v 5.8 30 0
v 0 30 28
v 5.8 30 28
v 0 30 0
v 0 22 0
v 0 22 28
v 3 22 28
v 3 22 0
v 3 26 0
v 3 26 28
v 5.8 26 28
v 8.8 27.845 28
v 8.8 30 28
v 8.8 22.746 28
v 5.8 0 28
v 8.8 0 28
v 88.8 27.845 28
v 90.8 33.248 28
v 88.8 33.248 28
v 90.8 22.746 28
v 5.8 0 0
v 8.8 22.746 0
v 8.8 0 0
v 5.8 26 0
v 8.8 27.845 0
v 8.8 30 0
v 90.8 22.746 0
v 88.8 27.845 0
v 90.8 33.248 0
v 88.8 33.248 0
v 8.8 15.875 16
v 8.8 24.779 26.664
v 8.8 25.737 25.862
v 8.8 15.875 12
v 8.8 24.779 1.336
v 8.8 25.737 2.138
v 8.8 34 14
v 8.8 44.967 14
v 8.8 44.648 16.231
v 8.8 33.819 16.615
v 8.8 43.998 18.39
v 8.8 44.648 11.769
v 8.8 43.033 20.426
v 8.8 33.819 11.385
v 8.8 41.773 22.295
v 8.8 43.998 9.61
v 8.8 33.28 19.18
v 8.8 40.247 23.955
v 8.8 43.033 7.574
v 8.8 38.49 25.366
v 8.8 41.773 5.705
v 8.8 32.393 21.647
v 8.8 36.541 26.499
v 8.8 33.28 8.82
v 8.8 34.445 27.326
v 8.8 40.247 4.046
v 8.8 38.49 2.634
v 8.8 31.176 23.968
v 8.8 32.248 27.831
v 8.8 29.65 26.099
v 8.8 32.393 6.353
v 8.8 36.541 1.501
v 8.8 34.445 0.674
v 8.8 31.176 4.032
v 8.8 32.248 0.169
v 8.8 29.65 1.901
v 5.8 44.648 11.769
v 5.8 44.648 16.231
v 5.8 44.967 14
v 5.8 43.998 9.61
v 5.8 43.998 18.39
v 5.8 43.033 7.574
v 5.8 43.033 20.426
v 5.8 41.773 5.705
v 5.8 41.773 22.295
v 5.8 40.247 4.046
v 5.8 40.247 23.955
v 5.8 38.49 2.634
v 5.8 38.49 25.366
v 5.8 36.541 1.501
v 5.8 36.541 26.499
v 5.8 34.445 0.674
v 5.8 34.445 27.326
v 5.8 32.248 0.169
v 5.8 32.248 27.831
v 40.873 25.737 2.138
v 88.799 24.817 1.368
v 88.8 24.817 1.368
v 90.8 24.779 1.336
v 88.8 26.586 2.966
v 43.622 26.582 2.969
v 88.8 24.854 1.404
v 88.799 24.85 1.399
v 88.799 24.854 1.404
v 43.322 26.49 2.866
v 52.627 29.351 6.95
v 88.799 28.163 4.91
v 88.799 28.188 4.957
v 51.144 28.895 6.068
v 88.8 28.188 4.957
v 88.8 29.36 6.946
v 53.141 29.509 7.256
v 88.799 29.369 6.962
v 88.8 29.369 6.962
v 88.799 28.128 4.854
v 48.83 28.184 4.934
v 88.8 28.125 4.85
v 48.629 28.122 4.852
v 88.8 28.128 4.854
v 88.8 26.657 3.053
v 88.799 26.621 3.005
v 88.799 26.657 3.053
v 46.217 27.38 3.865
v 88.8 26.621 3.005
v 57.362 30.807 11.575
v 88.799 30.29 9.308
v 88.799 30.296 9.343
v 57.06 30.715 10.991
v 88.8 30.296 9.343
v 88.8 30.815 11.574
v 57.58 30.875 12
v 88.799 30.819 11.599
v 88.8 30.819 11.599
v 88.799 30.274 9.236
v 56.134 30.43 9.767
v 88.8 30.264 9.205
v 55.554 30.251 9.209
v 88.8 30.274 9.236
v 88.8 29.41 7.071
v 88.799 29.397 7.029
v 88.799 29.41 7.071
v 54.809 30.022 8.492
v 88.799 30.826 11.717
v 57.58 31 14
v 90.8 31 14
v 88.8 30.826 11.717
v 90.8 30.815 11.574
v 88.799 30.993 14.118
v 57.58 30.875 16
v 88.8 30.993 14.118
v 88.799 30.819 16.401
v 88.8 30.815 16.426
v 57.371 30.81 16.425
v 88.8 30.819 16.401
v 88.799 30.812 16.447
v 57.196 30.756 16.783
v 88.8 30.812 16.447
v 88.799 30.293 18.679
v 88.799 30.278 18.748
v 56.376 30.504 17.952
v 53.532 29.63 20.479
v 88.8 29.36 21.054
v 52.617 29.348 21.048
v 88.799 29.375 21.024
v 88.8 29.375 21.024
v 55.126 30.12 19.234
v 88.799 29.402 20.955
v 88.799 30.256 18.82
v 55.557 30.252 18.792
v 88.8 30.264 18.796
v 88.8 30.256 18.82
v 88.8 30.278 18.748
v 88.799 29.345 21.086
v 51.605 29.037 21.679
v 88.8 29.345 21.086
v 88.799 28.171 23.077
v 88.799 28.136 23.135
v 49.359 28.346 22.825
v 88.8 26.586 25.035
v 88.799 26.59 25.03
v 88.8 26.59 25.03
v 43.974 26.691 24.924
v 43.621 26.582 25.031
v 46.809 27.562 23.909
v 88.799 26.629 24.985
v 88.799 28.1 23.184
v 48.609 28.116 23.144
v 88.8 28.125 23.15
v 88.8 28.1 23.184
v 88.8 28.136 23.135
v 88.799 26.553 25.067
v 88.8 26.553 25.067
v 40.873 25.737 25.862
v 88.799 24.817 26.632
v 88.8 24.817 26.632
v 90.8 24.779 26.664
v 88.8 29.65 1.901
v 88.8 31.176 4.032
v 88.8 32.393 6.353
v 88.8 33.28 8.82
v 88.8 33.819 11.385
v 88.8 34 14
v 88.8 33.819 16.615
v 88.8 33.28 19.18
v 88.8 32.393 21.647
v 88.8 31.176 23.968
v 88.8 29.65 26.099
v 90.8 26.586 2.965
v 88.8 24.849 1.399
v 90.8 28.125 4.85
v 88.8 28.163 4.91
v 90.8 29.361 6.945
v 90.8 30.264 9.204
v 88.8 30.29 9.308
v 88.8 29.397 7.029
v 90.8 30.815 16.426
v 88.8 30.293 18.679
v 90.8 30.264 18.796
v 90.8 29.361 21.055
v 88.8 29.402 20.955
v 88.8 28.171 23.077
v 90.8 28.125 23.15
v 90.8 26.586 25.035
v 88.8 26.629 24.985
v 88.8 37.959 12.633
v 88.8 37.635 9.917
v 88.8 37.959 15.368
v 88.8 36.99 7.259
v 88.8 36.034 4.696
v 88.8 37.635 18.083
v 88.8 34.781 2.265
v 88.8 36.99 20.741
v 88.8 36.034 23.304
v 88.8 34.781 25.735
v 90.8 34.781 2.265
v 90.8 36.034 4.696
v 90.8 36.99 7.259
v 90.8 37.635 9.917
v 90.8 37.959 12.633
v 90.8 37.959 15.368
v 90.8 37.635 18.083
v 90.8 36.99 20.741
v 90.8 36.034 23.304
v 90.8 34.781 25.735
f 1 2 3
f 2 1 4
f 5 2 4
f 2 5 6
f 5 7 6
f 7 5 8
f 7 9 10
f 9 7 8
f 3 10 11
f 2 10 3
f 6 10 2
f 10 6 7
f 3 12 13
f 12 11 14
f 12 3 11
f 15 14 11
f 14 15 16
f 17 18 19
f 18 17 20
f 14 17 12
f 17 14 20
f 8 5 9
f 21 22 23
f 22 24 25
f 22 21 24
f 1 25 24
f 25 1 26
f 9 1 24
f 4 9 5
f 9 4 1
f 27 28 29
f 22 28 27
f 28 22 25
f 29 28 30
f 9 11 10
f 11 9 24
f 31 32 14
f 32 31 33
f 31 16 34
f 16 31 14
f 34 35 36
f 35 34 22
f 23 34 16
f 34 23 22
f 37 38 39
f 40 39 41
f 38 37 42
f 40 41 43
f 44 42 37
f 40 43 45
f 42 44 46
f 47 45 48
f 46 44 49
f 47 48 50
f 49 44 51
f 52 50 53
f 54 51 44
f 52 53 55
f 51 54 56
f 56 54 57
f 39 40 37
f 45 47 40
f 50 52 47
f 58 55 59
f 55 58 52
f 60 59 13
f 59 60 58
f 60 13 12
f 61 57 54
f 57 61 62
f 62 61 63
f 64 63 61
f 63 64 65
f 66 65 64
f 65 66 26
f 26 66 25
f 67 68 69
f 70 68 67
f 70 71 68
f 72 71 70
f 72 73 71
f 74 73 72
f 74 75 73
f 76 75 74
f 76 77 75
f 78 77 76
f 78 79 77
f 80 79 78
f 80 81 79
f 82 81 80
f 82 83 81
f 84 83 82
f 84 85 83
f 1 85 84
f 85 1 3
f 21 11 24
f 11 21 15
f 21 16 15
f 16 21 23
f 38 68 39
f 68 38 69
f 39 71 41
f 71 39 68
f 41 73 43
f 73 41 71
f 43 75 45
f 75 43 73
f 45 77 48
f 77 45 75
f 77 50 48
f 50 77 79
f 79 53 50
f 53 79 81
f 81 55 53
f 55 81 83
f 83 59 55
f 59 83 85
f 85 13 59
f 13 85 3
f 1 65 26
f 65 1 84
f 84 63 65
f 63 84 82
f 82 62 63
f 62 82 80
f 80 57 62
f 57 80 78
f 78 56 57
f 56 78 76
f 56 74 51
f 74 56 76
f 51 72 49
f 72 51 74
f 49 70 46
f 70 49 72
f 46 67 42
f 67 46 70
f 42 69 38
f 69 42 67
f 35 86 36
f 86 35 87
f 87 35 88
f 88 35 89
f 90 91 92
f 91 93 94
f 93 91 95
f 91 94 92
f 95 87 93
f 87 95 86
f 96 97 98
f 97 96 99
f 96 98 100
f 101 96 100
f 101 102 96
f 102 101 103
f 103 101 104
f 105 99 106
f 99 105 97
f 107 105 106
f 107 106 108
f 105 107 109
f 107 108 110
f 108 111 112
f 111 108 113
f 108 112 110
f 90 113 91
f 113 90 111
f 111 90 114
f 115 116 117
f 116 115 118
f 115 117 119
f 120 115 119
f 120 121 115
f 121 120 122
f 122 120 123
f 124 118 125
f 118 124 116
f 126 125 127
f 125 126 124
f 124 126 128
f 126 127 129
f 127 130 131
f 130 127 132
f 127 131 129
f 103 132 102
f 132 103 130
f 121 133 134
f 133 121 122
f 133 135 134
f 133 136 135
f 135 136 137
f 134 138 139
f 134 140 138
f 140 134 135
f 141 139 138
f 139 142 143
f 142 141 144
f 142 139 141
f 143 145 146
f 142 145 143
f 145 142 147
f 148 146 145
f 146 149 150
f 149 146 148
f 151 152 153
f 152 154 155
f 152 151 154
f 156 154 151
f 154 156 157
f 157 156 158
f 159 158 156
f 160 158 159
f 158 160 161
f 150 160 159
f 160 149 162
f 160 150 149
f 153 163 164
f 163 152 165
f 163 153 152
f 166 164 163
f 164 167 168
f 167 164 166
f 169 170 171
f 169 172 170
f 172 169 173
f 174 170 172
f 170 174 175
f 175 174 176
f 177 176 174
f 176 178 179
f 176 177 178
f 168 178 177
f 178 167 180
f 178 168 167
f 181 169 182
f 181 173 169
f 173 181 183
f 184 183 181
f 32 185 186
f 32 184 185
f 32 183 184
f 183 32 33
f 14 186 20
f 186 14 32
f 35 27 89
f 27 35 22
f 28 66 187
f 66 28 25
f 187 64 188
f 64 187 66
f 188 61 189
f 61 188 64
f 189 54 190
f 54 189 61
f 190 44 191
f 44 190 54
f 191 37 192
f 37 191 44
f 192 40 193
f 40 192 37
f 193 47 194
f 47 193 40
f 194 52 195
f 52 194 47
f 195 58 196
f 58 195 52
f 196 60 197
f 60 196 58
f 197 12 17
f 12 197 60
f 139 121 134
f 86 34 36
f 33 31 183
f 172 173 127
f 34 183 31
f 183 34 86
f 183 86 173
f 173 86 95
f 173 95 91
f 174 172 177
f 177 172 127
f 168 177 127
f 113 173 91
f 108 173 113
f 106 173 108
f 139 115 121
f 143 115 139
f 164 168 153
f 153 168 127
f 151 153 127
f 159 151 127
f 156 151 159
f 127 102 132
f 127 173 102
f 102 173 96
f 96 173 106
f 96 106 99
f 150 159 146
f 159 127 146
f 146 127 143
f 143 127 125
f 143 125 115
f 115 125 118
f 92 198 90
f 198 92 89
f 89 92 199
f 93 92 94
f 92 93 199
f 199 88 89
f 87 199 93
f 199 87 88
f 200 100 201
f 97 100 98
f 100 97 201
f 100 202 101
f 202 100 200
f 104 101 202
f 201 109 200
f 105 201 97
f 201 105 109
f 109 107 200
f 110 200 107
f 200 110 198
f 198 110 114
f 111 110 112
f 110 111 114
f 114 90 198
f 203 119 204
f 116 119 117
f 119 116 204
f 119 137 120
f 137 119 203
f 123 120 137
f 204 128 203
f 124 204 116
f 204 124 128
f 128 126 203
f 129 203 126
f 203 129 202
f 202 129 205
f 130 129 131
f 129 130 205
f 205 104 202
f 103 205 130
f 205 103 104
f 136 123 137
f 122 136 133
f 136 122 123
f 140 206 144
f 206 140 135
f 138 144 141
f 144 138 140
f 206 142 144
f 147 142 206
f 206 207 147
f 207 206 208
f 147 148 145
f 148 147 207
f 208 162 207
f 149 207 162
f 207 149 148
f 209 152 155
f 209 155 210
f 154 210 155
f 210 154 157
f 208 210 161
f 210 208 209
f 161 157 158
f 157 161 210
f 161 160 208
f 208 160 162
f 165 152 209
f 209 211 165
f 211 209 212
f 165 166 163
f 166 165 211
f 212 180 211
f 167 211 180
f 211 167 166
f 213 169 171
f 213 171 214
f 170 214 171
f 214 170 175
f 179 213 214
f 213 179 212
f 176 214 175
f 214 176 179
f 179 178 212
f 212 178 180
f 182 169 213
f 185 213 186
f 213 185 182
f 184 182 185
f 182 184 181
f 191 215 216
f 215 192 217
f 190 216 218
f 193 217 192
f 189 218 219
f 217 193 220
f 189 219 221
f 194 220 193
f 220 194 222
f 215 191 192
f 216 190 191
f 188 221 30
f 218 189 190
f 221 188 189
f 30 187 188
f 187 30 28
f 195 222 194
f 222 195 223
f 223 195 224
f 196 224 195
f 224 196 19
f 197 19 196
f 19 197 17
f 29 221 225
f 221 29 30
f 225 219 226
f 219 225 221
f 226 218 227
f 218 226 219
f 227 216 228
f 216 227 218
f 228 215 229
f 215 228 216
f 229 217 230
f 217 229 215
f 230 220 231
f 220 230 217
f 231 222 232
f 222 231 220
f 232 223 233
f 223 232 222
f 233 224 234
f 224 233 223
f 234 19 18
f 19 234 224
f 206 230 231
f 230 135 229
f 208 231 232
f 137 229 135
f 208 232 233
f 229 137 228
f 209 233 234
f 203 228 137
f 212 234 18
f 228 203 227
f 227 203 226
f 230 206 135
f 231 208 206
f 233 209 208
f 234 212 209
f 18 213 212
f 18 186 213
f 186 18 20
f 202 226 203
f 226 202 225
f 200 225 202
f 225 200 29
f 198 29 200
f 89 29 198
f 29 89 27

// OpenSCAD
// Remix of "Spool Holder 1KG for NEO GRRF" ( http://www.thingiverse.com/thing:385773 ) by Luchador

// Laurenz 2014-07-06

// of spool holding middle part (use spool width + 5mm)
length = 80;

// of holder gap, orginally 2mm, gave 1.6mm on reprap neo with simplify3D
gapsize=2.8; //should work with 2.5

//original: holder is 5, big part is 3, gap is 2

module holder(gapsize)
{
	//bigger part of the holder unchanged
	difference()
	{
    luchadorspool();

	 translate([3,0,0])
		cube([100,100,100]);
	
	}

	//smaller part - stretch
	translate([3-.1,0,0]) //shift the overlap into position
		difference()
		{
		 scale([(gapsize+.2)/2,1,1]) //make an overlap of two times .1
			translate([-3,0,0])
				luchadorspool();
	
		 translate([gapsize+.2,0,0]) //make an overlap of two times .1
			cube([5000,5000,5000]);
		
		 //cutoff negative part
		 mirror([1,0,0])
			cube([1000,1000,1000]);
		}
}



// Haken
holder(gapsize);

translate([gapsize-2,0,0])
{
	// Anfangsstueck ohne Haken
	difference()
	{
	 luchadorspool();
	 translate([8,0,0])cube([100,100,100]);
	 cube([5,100,100]);
	}
	
	// Skalierter Mittelteil
	translate([8,0,0])
	 scale([length/82,1,1])
	  translate([-8,0,0])
	   difference()
	   {
	    luchadorspool();
	    union()
	    {
	     cube([8-0.001,200,200]);
	     translate([90,0,0])cube([100,100,100]);
	    }
	   }
	
	// Endstueck
	translate([-82+length,0,0])
	difference()
	{
	 luchadorspool();
	 translate([-1,-1,-1])cube([91-0.001,100,100]);
	}
}	


// created with STL to OpenSCAD converter ( http://www.thingiverse.com/thing:62666 ) ( http://jsfiddle.net/Riham/yzvGD/embedded/result/ )
module luchadorspool(scale) {polyhedron(
 points=[[8,24.779094696044922,26.663768768310547],[8,22.745990753173828,28.000051498413086],[8,0.00002421438694000244,28.000051498413086],[8,24.779094696044922,1.336330771446228],[8,25.736982345581055,2.1375997066497803],[8,15.874530792236328,12.00005054473877],[8,25.736982345581055,25.862499237060547],[8,24.779094696044922,26.663768768310547],[8,15.874530792236328,16.000051498413086],[8,15.874530792236328,16.000051498413086],[8,24.779094696044922,26.663768768310547],[8,0.00002421438694000244,28.000051498413086],[8,15.874530792236328,16.000051498413086],[8,0.00002421438694000244,28.000051498413086],[8,15.874530792236328,12.00005054473877],[8,15.874530792236328,12.00005054473877],[8,0.00002421438694000244,28.000051498413086],[8,0.00002421438694000244,0.000050000002374872565],[8,15.874530792236328,12.00005054473877],[8,0.00002421438694000244,0.000050000002374872565],[8,24.779094696044922,1.336330771446228],[8,24.779094696044922,1.336330771446228],[8,0.00002421438694000244,0.000050000002374872565],[8,22.745990753173828,0.000050000002374872565],[40.87483596801758,25.736982345581055,2.1375997066497803],[8,25.736982345581055,2.1375997066497803],[8,24.779094696044922,1.336330771446228],[92,26.586090087890625,2.965418577194214],[43.692378997802734,26.582246780395508,2.9689066410064697],[92,24.779094696044922,1.336330771446228],[92,24.779094696044922,1.336330771446228],[43.692378997802734,26.582246780395508,2.9689066410064697],[43.38553237915039,26.490190505981445,2.8655965328216553],[92,24.779094696044922,1.336330771446228],[43.38553237915039,26.490190505981445,2.8655965328216553],[40.87483596801758,25.736982345581055,2.1375997066497803],[51.4024772644043,28.895273208618164,6.067709445953369],[92,28.125194549560547,4.849645614624023],[52.92253112792969,29.35129165649414,6.950313568115234],[52.92253112792969,29.35129165649414,6.950313568115234],[92,28.125194549560547,4.849645614624023],[92,29.360822677612305,6.945445537567139],[52.92253112792969,29.35129165649414,6.950313568115234],[92,29.360822677612305,6.945445537567139],[53.44977569580078,29.509464263916016,7.256449222564697],[51.4024772644043,28.895273208618164,6.067709445953369],[49.031253814697266,28.18390655517578,4.934443950653076],[92,28.125194549560547,4.849645614624023],[92,28.125194549560547,4.849645614624023],[49.031253814697266,28.18390655517578,4.934443950653076],[48.824859619140625,28.12198829650879,4.852006435394287],[92,28.125194549560547,4.849645614624023],[48.824859619140625,28.12198829650879,4.852006435394287],[92,26.586090087890625,2.965418577194214],[92,26.586090087890625,2.965418577194214],[48.824859619140625,28.12198829650879,4.852006435394287],[46.35269546508789,27.380340576171875,3.864579439163208],[92,26.586090087890625,2.965418577194214],[46.35269546508789,27.380340576171875,3.864579439163208],[43.692378997802734,26.582246780395508,2.9689066410064697],[57.46689987182617,30.714601516723633,10.99138355255127],[92,30.264408111572266,9.204360961914062],[57.77556610107422,30.807201385498047,11.575401306152344],[57.77556610107422,30.807201385498047,11.575401306152344],[92,30.264408111572266,9.204360961914062],[92,30.81505012512207,11.5741605758667],[57.77556610107422,30.807201385498047,11.575401306152344],[92,30.81505012512207,11.5741605758667],[58,30.874530792236328,12.00005054473877],[57.46689987182617,30.714601516723633,10.99138355255127],[56.517704010009766,30.42984390258789,9.766770362854004],[92,30.264408111572266,9.204360961914062],[92,30.264408111572266,9.204360961914062],[56.517704010009766,30.42984390258789,9.766770362854004],[55.92249298095703,30.251279830932617,9.20854663848877],[92,30.264408111572266,9.204360961914062],[55.92249298095703,30.251279830932617,9.20854663848877],[92,29.360822677612305,6.945445537567139],[92,29.360822677612305,6.945445537567139],[55.92249298095703,30.251279830932617,9.20854663848877],[55.158836364746094,30.02218246459961,8.492351531982422],[92,29.360822677612305,6.945445537567139],[55.158836364746094,30.02218246459961,8.492351531982422],[53.44977569580078,29.509464263916016,7.256449222564697],[58,30.874530792236328,12.00005054473877],[92,30.81505012512207,11.5741605758667],[58,31.000022888183594,14.00005054473877],[58,31.000022888183594,14.00005054473877],[92,30.81505012512207,11.5741605758667],[92,31.000022888183594,14.00005054473877],[58,31.000022888183594,14.00005054473877],[92,31.000022888183594,14.00005054473877],[58,30.874530792236328,16.000051498413086],[58,30.874530792236328,16.000051498413086],[92,31.000022888183594,14.00005054473877],[92,30.81505012512207,16.425941467285156],[58,30.874530792236328,16.000051498413086],[92,30.81505012512207,16.425941467285156],[57.78570556640625,30.810243606567383,16.425212860107422],[57.78570556640625,30.810243606567383,16.425212860107422],[92,30.81505012512207,16.425941467285156],[57.60542297363281,30.75615882873535,16.782894134521484],[57.60542297363281,30.75615882873535,16.782894134521484],[92,30.81505012512207,16.425941467285156],[92,30.264408111572266,18.795740127563477],[57.60542297363281,30.75615882873535,16.782894134521484],[92,30.264408111572266,18.795740127563477],[56.765594482421875,30.504209518432617,17.952293395996094],[52.91258239746094,29.34830665588379,21.048480987548828],[53.850196838378906,29.62959098815918,20.47892189025879],[92,29.360822677612305,21.05465316772461],[92,29.360822677612305,21.05465316772461],[53.850196838378906,29.62959098815918,20.47892189025879],[55.484127044677734,30.119770050048828,19.23390769958496],[92,29.360822677612305,21.05465316772461],[55.484127044677734,30.119770050048828,19.23390769958496],[92,30.264408111572266,18.795740127563477],[92,30.264408111572266,18.795740127563477],[55.484127044677734,30.119770050048828,19.23390769958496],[55.9259033203125,30.252304077148438,18.792081832885742],[92,30.264408111572266,18.795740127563477],[55.9259033203125,30.252304077148438,18.792081832885742],[56.765594482421875,30.504209518432617,17.952293395996094],[52.91258239746094,29.34830665588379,21.048480987548828],[92,29.360822677612305,21.05465316772461],[51.87522506713867,29.037099838256836,21.678625106811523],[51.87522506713867,29.037099838256836,21.678625106811523],[92,29.360822677612305,21.05465316772461],[92,28.125194549560547,23.150455474853516],[51.87522506713867,29.037099838256836,21.678625106811523],[92,28.125194549560547,23.150455474853516],[49.573028564453125,28.3464412689209,22.824626922607422],[43.691871643066406,26.582094192504883,25.03069496154785],[44.053531646728516,26.69059181213379,24.923906326293945],[92,26.586090087890625,25.03468132019043],[92,26.586090087890625,25.03468132019043],[44.053531646728516,26.69059181213379,24.923906326293945],[46.9597053527832,27.562442779541016,23.90891456604004],[92,26.586090087890625,25.03468132019043],[46.9597053527832,27.562442779541016,23.90891456604004],[92,28.125194549560547,23.150455474853516],[92,28.125194549560547,23.150455474853516],[46.9597053527832,27.562442779541016,23.90891456604004],[48.80404281616211,28.11574363708496,23.143686294555664],[92,28.125194549560547,23.150455474853516],[48.80404281616211,28.11574363708496,23.143686294555664],[49.573028564453125,28.3464412689209,22.824626922607422],[43.691871643066406,26.582094192504883,25.03069496154785],[92,26.586090087890625,25.03468132019043],[40.87483596801758,25.736982345581055,25.862499237060547],[40.87483596801758,25.736982345581055,25.862499237060547],[92,26.586090087890625,25.03468132019043],[92,24.779094696044922,26.663768768310547],[40.87483596801758,25.736982345581055,25.862499237060547],[92,24.779094696044922,26.663768768310547],[8,25.736982345581055,25.862499237060547],[8,25.736982345581055,25.862499237060547],[92,24.779094696044922,26.663768768310547],[8,24.779094696044922,26.663768768310547],[8,24.779094696044922,26.663768768310547],[92,24.779094696044922,26.663768768310547],[92,22.745990753173828,28.000051498413086],[8,24.779094696044922,26.663768768310547],[92,22.745990753173828,28.000051498413086],[8,22.745990753173828,28.000051498413086],[40.87483596801758,25.736982345581055,2.1375997066497803],[8,24.779094696044922,1.336330771446228],[92,24.779094696044922,1.336330771446228],[92,24.779094696044922,1.336330771446228],[8,24.779094696044922,1.336330771446228],[8,22.745990753173828,0.000050000002374872565],[92,24.779094696044922,1.336330771446228],[8,22.745990753173828,0.000050000002374872565],[92,22.745990753173828,0.000050000002374872565],[2.423311710667139e-15,30.000022888183594,0.000050000002374872565],[2.423311710667139e-15,30.000022888183594,28.000051498413086],[5,30.000022888183594,0.000050000002374872565],[5,30.000022888183594,0.000050000002374872565],[2.423311710667139e-15,30.000022888183594,28.000051498413086],[5,30.000022888183594,28.000051498413086],[8,34.44451904296875,0.6736247539520264],[8,31.175521850585938,4.0324387550354],[8,29.64979362487793,1.9011133909225464],[8,27.845256805419922,0.000050000002374872565],[8,30.000022888183594,0.000050000002374872565],[8,29.64979362487793,1.9011133909225464],[8,29.64979362487793,1.9011133909225464],[8,30.000022888183594,0.000050000002374872565],[8,32.24764633178711,0.1693996638059616],[8,29.64979362487793,1.9011133909225464],[8,32.24764633178711,0.1693996638059616],[8,34.44451904296875,0.6736247539520264],[8,33.8192253112793,16.614952087402344],[8,43.03263854980469,20.426424026489258],[8,33.28026580810547,19.180086135864258],[8,33.28026580810547,19.180086135864258],[8,43.03263854980469,20.426424026489258],[8,41.77272033691406,22.295406341552734],[8,33.28026580810547,19.180086135864258],[8,41.77272033691406,22.295406341552734],[8,32.393402099609375,21.646636962890625],[8,43.03263854980469,7.573676586151123],[8,33.8192253112793,11.385149002075195],[8,33.28026580810547,8.820013999938965],[8,34.44451904296875,0.6736247539520264],[8,36.541038513183594,1.5013397932052612],[8,31.175521850585938,4.0324387550354],[8,31.175521850585938,4.0324387550354],[8,36.541038513183594,1.5013397932052612],[8,38.4898567199707,2.6338553428649902],[8,31.175521850585938,4.0324387550354],[8,38.4898567199707,2.6338553428649902],[8,32.393402099609375,6.353463172912598],[8,32.393402099609375,6.353463172912598],[8,38.4898567199707,2.6338553428649902],[8,40.24697494506836,4.04559850692749],[8,32.393402099609375,6.353463172912598],[8,40.24697494506836,4.04559850692749],[8,33.28026580810547,8.820013999938965],[8,33.28026580810547,8.820013999938965],[8,40.24697494506836,4.04559850692749],[8,41.77272033691406,5.704692840576172],[8,33.28026580810547,8.820013999938965],[8,41.77272033691406,5.704692840576172],[8,43.03263854980469,7.573676586151123],[8,30.000022888183594,28.000051498413086],[8,27.845256805419922,28.000051498413086],[8,32.24764633178711,27.83070182800293],[8,32.24764633178711,27.83070182800293],[8,27.845256805419922,28.000051498413086],[8,29.64979362487793,26.098987579345703],[8,32.24764633178711,27.83070182800293],[8,29.64979362487793,26.098987579345703],[8,34.44451904296875,27.326475143432617],[8,34.44451904296875,27.326475143432617],[8,29.64979362487793,26.098987579345703],[8,31.175521850585938,23.967660903930664],[8,41.77272033691406,22.295406341552734],[8,40.24697494506836,23.95450210571289],[8,32.393402099609375,21.646636962890625],[8,32.393402099609375,21.646636962890625],[8,40.24697494506836,23.95450210571289],[8,38.4898567199707,25.36624526977539],[8,32.393402099609375,21.646636962890625],[8,38.4898567199707,25.36624526977539],[8,31.175521850585938,23.967660903930664],[8,31.175521850585938,23.967660903930664],[8,38.4898567199707,25.36624526977539],[8,36.541038513183594,26.498760223388672],[8,31.175521850585938,23.967660903930664],[8,36.541038513183594,26.498760223388672],[8,34.44451904296875,27.326475143432617],[8,43.03263854980469,7.573676586151123],[8,43.9982795715332,9.610347747802734],[8,33.8192253112793,11.385149002075195],[8,33.8192253112793,11.385149002075195],[8,43.9982795715332,9.610347747802734],[8,44.6478385925293,11.768717765808105],[8,33.8192253112793,11.385149002075195],[8,44.6478385925293,11.768717765808105],[8,34.000022888183594,14.00005054473877],[8,44.6478385925293,11.768717765808105],[8,44.966651916503906,14.00005054473877],[8,34.000022888183594,14.00005054473877],[8,34.000022888183594,14.00005054473877],[8,44.966651916503906,14.00005054473877],[8,44.6478385925293,16.23138427734375],[8,34.000022888183594,14.00005054473877],[8,44.6478385925293,16.23138427734375],[8,33.8192253112793,16.614952087402344],[8,33.8192253112793,16.614952087402344],[8,44.6478385925293,16.23138427734375],[8,43.9982795715332,18.389753341674805],[8,33.8192253112793,16.614952087402344],[8,43.9982795715332,18.389753341674805],[8,43.03263854980469,20.426424026489258],[0,22.000024795532227,28.000051498413086],[2.423311710667139e-15,30.000022888183594,28.000051498413086],[0,22.000024795532227,0.000050000002374872565],[0,22.000024795532227,0.000050000002374872565],[2.423311710667139e-15,30.000022888183594,28.000051498413086],[2.423311710667139e-15,30.000022888183594,0.000050000002374872565],[3,22.000024795532227,28.000051498413086],[0,22.000024795532227,28.000051498413086],[3,22.000024795532227,0.000050000002374872565],[3,22.000024795532227,0.000050000002374872565],[0,22.000024795532227,28.000051498413086],[0,22.000024795532227,0.000050000002374872565],[3,26.000024795532227,28.000051498413086],[3,22.000024795532227,28.000051498413086],[3,26.000024795532227,0.000050000002374872565],[3,26.000024795532227,0.000050000002374872565],[3,22.000024795532227,28.000051498413086],[3,22.000024795532227,0.000050000002374872565],[5,26.000024795532227,28.000051498413086],[3,26.000024795532227,28.000051498413086],[5,26.000024795532227,0.000050000002374872565],[5,26.000024795532227,0.000050000002374872565],[3,26.000024795532227,28.000051498413086],[3,26.000024795532227,0.000050000002374872565],[5,0.00002421438694000244,28.000051498413086],[5,26.000024795532227,28.000051498413086],[5,0.00002421438694000244,0.000050000002374872565],[5,0.00002421438694000244,0.000050000002374872565],[5,26.000024795532227,28.000051498413086],[5,26.000024795532227,0.000050000002374872565],[8,0.00002421438694000244,28.000051498413086],[5,0.00002421438694000244,28.000051498413086],[8,0.00002421438694000244,0.000050000002374872565],[8,0.00002421438694000244,0.000050000002374872565],[5,0.00002421438694000244,28.000051498413086],[5,0.00002421438694000244,0.000050000002374872565],[0,22.000024795532227,28.000051498413086],[3,22.000024795532227,28.000051498413086],[2.423311710667139e-15,30.000022888183594,28.000051498413086],[2.423311710667139e-15,30.000022888183594,28.000051498413086],[3,22.000024795532227,28.000051498413086],[3,26.000024795532227,28.000051498413086],[2.423311710667139e-15,30.000022888183594,28.000051498413086],[3,26.000024795532227,28.000051498413086],[5,30.000022888183594,28.000051498413086],[5,30.000022888183594,28.000051498413086],[3,26.000024795532227,28.000051498413086],[5,26.000024795532227,28.000051498413086],[5,30.000022888183594,28.000051498413086],[5,26.000024795532227,28.000051498413086],[8,30.000022888183594,28.000051498413086],[8,30.000022888183594,28.000051498413086],[5,26.000024795532227,28.000051498413086],[8,27.845256805419922,28.000051498413086],[92,22.745990753173828,28.000051498413086],[92,33.248313903808594,28.000051498413086],[90,33.248313903808594,28.000051498413086],[5,0.00002421438694000244,28.000051498413086],[8,0.00002421438694000244,28.000051498413086],[5,26.000024795532227,28.000051498413086],[5,26.000024795532227,28.000051498413086],[8,0.00002421438694000244,28.000051498413086],[8,22.745990753173828,28.000051498413086],[5,26.000024795532227,28.000051498413086],[8,22.745990753173828,28.000051498413086],[8,27.845256805419922,28.000051498413086],[8,27.845256805419922,28.000051498413086],[8,22.745990753173828,28.000051498413086],[92,22.745990753173828,28.000051498413086],[8,27.845256805419922,28.000051498413086],[92,22.745990753173828,28.000051498413086],[90,27.845256805419922,28.000051498413086],[90,27.845256805419922,28.000051498413086],[92,22.745990753173828,28.000051498413086],[90,33.248313903808594,28.000051498413086],[8,22.745990753173828,0.000050000002374872565],[8,0.00002421438694000244,0.000050000002374872565],[5,0.00002421438694000244,0.000050000002374872565],[8,30.000022888183594,0.000050000002374872565],[8,27.845256805419922,0.000050000002374872565],[5,30.000022888183594,0.000050000002374872565],[5,30.000022888183594,0.000050000002374872565],[8,27.845256805419922,0.000050000002374872565],[5,26.000024795532227,0.000050000002374872565],[5,30.000022888183594,0.000050000002374872565],[5,26.000024795532227,0.000050000002374872565],[2.423311710667139e-15,30.000022888183594,0.000050000002374872565],[2.423311710667139e-15,30.000022888183594,0.000050000002374872565],[5,26.000024795532227,0.000050000002374872565],[3,26.000024795532227,0.000050000002374872565],[2.423311710667139e-15,30.000022888183594,0.000050000002374872565],[3,26.000024795532227,0.000050000002374872565],[0,22.000024795532227,0.000050000002374872565],[0,22.000024795532227,0.000050000002374872565],[3,26.000024795532227,0.000050000002374872565],[3,22.000024795532227,0.000050000002374872565],[90,33.248313903808594,0.000050000002374872565],[92,33.248313903808594,0.000050000002374872565],[90,27.845256805419922,0.000050000002374872565],[90,27.845256805419922,0.000050000002374872565],[92,33.248313903808594,0.000050000002374872565],[92,22.745990753173828,0.000050000002374872565],[90,27.845256805419922,0.000050000002374872565],[92,22.745990753173828,0.000050000002374872565],[8,27.845256805419922,0.000050000002374872565],[8,27.845256805419922,0.000050000002374872565],[92,22.745990753173828,0.000050000002374872565],[8,22.745990753173828,0.000050000002374872565],[8,27.845256805419922,0.000050000002374872565],[8,22.745990753173828,0.000050000002374872565],[5,26.000024795532227,0.000050000002374872565],[5,26.000024795532227,0.000050000002374872565],[8,22.745990753173828,0.000050000002374872565],[5,0.00002421438694000244,0.000050000002374872565],[90,27.845256805419922,0.000050000002374872565],[8,27.845256805419922,0.000050000002374872565],[8,29.64979362487793,1.9011133909225464],[90,27.845256805419922,0.000050000002374872565],[8,29.64979362487793,1.9011133909225464],[90,29.64979362487793,1.9011133909225464],[90,29.64979362487793,1.9011133909225464],[8,29.64979362487793,1.9011133909225464],[8,31.175521850585938,4.0324387550354],[90,29.64979362487793,1.9011133909225464],[8,31.175521850585938,4.0324387550354],[90,31.175521850585938,4.0324387550354],[90,31.175521850585938,4.0324387550354],[8,31.175521850585938,4.0324387550354],[8,32.393402099609375,6.353463172912598],[90,31.175521850585938,4.0324387550354],[8,32.393402099609375,6.353463172912598],[90,32.393402099609375,6.353463172912598],[90,32.393402099609375,6.353463172912598],[8,32.393402099609375,6.353463172912598],[8,33.28026580810547,8.820013999938965],[90,32.393402099609375,6.353463172912598],[8,33.28026580810547,8.820013999938965],[90,33.28026580810547,8.820013999938965],[90,33.28026580810547,8.820013999938965],[8,33.28026580810547,8.820013999938965],[8,33.8192253112793,11.385149002075195],[90,33.28026580810547,8.820013999938965],[8,33.8192253112793,11.385149002075195],[90,33.8192253112793,11.385149002075195],[90,33.8192253112793,11.385149002075195],[8,33.8192253112793,11.385149002075195],[8,34.000022888183594,14.00005054473877],[90,33.8192253112793,11.385149002075195],[8,34.000022888183594,14.00005054473877],[90,34.000022888183594,14.00005054473877],[90,34.000022888183594,14.00005054473877],[8,34.000022888183594,14.00005054473877],[8,33.8192253112793,16.614952087402344],[90,34.000022888183594,14.00005054473877],[8,33.8192253112793,16.614952087402344],[90,33.8192253112793,16.614952087402344],[90,33.8192253112793,16.614952087402344],[8,33.8192253112793,16.614952087402344],[8,33.28026580810547,19.180086135864258],[90,33.8192253112793,16.614952087402344],[8,33.28026580810547,19.180086135864258],[90,33.28026580810547,19.180086135864258],[90,33.28026580810547,19.180086135864258],[8,33.28026580810547,19.180086135864258],[8,32.393402099609375,21.646636962890625],[90,33.28026580810547,19.180086135864258],[8,32.393402099609375,21.646636962890625],[90,32.393402099609375,21.646636962890625],[90,32.393402099609375,21.646636962890625],[8,32.393402099609375,21.646636962890625],[8,31.175521850585938,23.967660903930664],[90,32.393402099609375,21.646636962890625],[8,31.175521850585938,23.967660903930664],[90,31.175521850585938,23.967660903930664],[90,31.175521850585938,23.967660903930664],[8,31.175521850585938,23.967660903930664],[8,29.64979362487793,26.098987579345703],[90,31.175521850585938,23.967660903930664],[8,29.64979362487793,26.098987579345703],[90,29.64979362487793,26.098987579345703],[90,29.64979362487793,26.098987579345703],[8,29.64979362487793,26.098987579345703],[8,27.845256805419922,28.000051498413086],[90,29.64979362487793,26.098987579345703],[8,27.845256805419922,28.000051498413086],[90,27.845256805419922,28.000051498413086],[90,29.64979362487793,26.098987579345703],[90,27.845256805419922,28.000051498413086],[90,33.248313903808594,28.000051498413086],[90,29.64979362487793,26.098987579345703],[90,33.248313903808594,28.000051498413086],[90,31.175521850585938,23.967660903930664],[90,31.175521850585938,23.967660903930664],[90,33.248313903808594,28.000051498413086],[90,34.78114700317383,25.734920501708984],[90,31.175521850585938,23.967660903930664],[90,34.78114700317383,25.734920501708984],[90,32.393402099609375,21.646636962890625],[90,32.393402099609375,21.646636962890625],[90,34.78114700317383,25.734920501708984],[90,36.034263610839844,23.303850173950195],[90,32.393402099609375,21.646636962890625],[90,36.034263610839844,23.303850173950195],[90,33.28026580810547,19.180086135864258],[90,33.28026580810547,19.180086135864258],[90,36.034263610839844,23.303850173950195],[90,36.98994445800781,20.74121856689453],[90,33.28026580810547,19.180086135864258],[90,36.98994445800781,20.74121856689453],[90,33.8192253112793,16.614952087402344],[90,36.98994445800781,20.74121856689453],[90,37.634674072265625,18.083261489868164],[90,33.8192253112793,16.614952087402344],[90,33.8192253112793,16.614952087402344],[90,37.634674072265625,18.083261489868164],[90,37.95933532714844,15.36756706237793],[90,33.8192253112793,16.614952087402344],[90,37.95933532714844,15.36756706237793],[90,34.000022888183594,14.00005054473877],[90,34.000022888183594,14.00005054473877],[90,37.95933532714844,15.36756706237793],[90,37.95933532714844,12.63253402709961],[90,34.000022888183594,14.00005054473877],[90,37.95933532714844,12.63253402709961],[90,33.8192253112793,11.385149002075195],[90,33.8192253112793,11.385149002075195],[90,37.95933532714844,12.63253402709961],[90,37.634674072265625,9.916838645935059],[90,33.8192253112793,11.385149002075195],[90,37.634674072265625,9.916838645935059],[90,33.28026580810547,8.820013999938965],[90,33.28026580810547,8.820013999938965],[90,37.634674072265625,9.916838645935059],[90,36.98994445800781,7.25888204574585],[90,33.28026580810547,8.820013999938965],[90,36.98994445800781,7.25888204574585],[90,32.393402099609375,6.353463172912598],[90,32.393402099609375,6.353463172912598],[90,36.98994445800781,7.25888204574585],[90,36.034263610839844,4.6962504386901855],[90,32.393402099609375,6.353463172912598],[90,36.034263610839844,4.6962504386901855],[90,31.175521850585938,4.0324387550354],[90,31.175521850585938,4.0324387550354],[90,36.034263610839844,4.6962504386901855],[90,34.78114700317383,2.265181064605713],[90,31.175521850585938,4.0324387550354],[90,34.78114700317383,2.265181064605713],[90,29.64979362487793,1.9011133909225464],[90,29.64979362487793,1.9011133909225464],[90,34.78114700317383,2.265181064605713],[90,33.248313903808594,0.000050000002374872565],[90,29.64979362487793,1.9011133909225464],[90,33.248313903808594,0.000050000002374872565],[90,27.845256805419922,0.000050000002374872565],[92,33.248313903808594,0.000050000002374872565],[90,33.248313903808594,0.000050000002374872565],[90,34.78114700317383,2.265181064605713],[92,33.248313903808594,0.000050000002374872565],[90,34.78114700317383,2.265181064605713],[92,34.78114700317383,2.265181064605713],[92,34.78114700317383,2.265181064605713],[90,34.78114700317383,2.265181064605713],[90,36.034263610839844,4.6962504386901855],[92,34.78114700317383,2.265181064605713],[90,36.034263610839844,4.6962504386901855],[92,36.034263610839844,4.6962504386901855],[92,36.034263610839844,4.6962504386901855],[90,36.034263610839844,4.6962504386901855],[90,36.98994445800781,7.25888204574585],[92,36.034263610839844,4.6962504386901855],[90,36.98994445800781,7.25888204574585],[92,36.98994445800781,7.25888204574585],[92,36.98994445800781,7.25888204574585],[90,36.98994445800781,7.25888204574585],[90,37.634674072265625,9.916838645935059],[92,36.98994445800781,7.25888204574585],[90,37.634674072265625,9.916838645935059],[92,37.634674072265625,9.916838645935059],[92,37.634674072265625,9.916838645935059],[90,37.634674072265625,9.916838645935059],[90,37.95933532714844,12.63253402709961],[92,37.634674072265625,9.916838645935059],[90,37.95933532714844,12.63253402709961],[92,37.95933532714844,12.63253402709961],[92,37.95933532714844,12.63253402709961],[90,37.95933532714844,12.63253402709961],[90,37.95933532714844,15.36756706237793],[92,37.95933532714844,12.63253402709961],[90,37.95933532714844,15.36756706237793],[92,37.95933532714844,15.36756706237793],[92,37.95933532714844,15.36756706237793],[90,37.95933532714844,15.36756706237793],[90,37.634674072265625,18.083261489868164],[92,37.95933532714844,15.36756706237793],[90,37.634674072265625,18.083261489868164],[92,37.634674072265625,18.083261489868164],[92,37.634674072265625,18.083261489868164],[90,37.634674072265625,18.083261489868164],[90,36.98994445800781,20.74121856689453],[92,37.634674072265625,18.083261489868164],[90,36.98994445800781,20.74121856689453],[92,36.98994445800781,20.74121856689453],[92,36.98994445800781,20.74121856689453],[90,36.98994445800781,20.74121856689453],[90,36.034263610839844,23.303850173950195],[92,36.98994445800781,20.74121856689453],[90,36.034263610839844,23.303850173950195],[92,36.034263610839844,23.303850173950195],[92,36.034263610839844,23.303850173950195],[90,36.034263610839844,23.303850173950195],[90,34.78114700317383,25.734920501708984],[92,36.034263610839844,23.303850173950195],[90,34.78114700317383,25.734920501708984],[92,34.78114700317383,25.734920501708984],[92,34.78114700317383,25.734920501708984],[90,34.78114700317383,25.734920501708984],[90,33.248313903808594,28.000051498413086],[92,34.78114700317383,25.734920501708984],[90,33.248313903808594,28.000051498413086],[92,33.248313903808594,28.000051498413086],[92,24.779094696044922,1.336330771446228],[92,22.745990753173828,0.000050000002374872565],[92,33.248313903808594,0.000050000002374872565],[92,33.248313903808594,28.000051498413086],[92,22.745990753173828,28.000051498413086],[92,24.779094696044922,26.663768768310547],[92,24.779094696044922,26.663768768310547],[92,26.586090087890625,25.03468132019043],[92,33.248313903808594,28.000051498413086],[92,33.248313903808594,28.000051498413086],[92,26.586090087890625,25.03468132019043],[92,28.125194549560547,23.150455474853516],[92,33.248313903808594,28.000051498413086],[92,28.125194549560547,23.150455474853516],[92,34.78114700317383,25.734920501708984],[92,34.78114700317383,25.734920501708984],[92,28.125194549560547,23.150455474853516],[92,29.360822677612305,21.05465316772461],[92,34.78114700317383,25.734920501708984],[92,29.360822677612305,21.05465316772461],[92,36.034263610839844,23.303850173950195],[92,36.034263610839844,23.303850173950195],[92,29.360822677612305,21.05465316772461],[92,36.98994445800781,20.74121856689453],[92,36.98994445800781,20.74121856689453],[92,29.360822677612305,21.05465316772461],[92,30.264408111572266,18.795740127563477],[92,36.98994445800781,20.74121856689453],[92,30.264408111572266,18.795740127563477],[92,37.634674072265625,18.083261489868164],[92,37.634674072265625,18.083261489868164],[92,30.264408111572266,18.795740127563477],[92,30.81505012512207,16.425941467285156],[92,37.634674072265625,18.083261489868164],[92,30.81505012512207,16.425941467285156],[92,37.95933532714844,15.36756706237793],[92,37.95933532714844,15.36756706237793],[92,30.81505012512207,16.425941467285156],[92,31.000022888183594,14.00005054473877],[92,37.95933532714844,15.36756706237793],[92,31.000022888183594,14.00005054473877],[92,37.95933532714844,12.63253402709961],[92,37.95933532714844,12.63253402709961],[92,31.000022888183594,14.00005054473877],[92,30.81505012512207,11.5741605758667],[92,37.95933532714844,12.63253402709961],[92,30.81505012512207,11.5741605758667],[92,37.634674072265625,9.916838645935059],[92,37.634674072265625,9.916838645935059],[92,30.81505012512207,11.5741605758667],[92,36.98994445800781,7.25888204574585],[92,36.98994445800781,7.25888204574585],[92,30.81505012512207,11.5741605758667],[92,30.264408111572266,9.204360961914062],[92,36.98994445800781,7.25888204574585],[92,30.264408111572266,9.204360961914062],[92,36.034263610839844,4.6962504386901855],[92,36.034263610839844,4.6962504386901855],[92,30.264408111572266,9.204360961914062],[92,29.360822677612305,6.945445537567139],[92,36.034263610839844,4.6962504386901855],[92,29.360822677612305,6.945445537567139],[92,34.78114700317383,2.265181064605713],[92,34.78114700317383,2.265181064605713],[92,29.360822677612305,6.945445537567139],[92,28.125194549560547,4.849645614624023],[92,34.78114700317383,2.265181064605713],[92,28.125194549560547,4.849645614624023],[92,33.248313903808594,0.000050000002374872565],[92,33.248313903808594,0.000050000002374872565],[92,28.125194549560547,4.849645614624023],[92,26.586090087890625,2.965418577194214],[92,33.248313903808594,0.000050000002374872565],[92,26.586090087890625,2.965418577194214],[92,24.779094696044922,1.336330771446228],[5,32.24764633178711,27.83070182800293],[5,41.77272033691406,22.295406341552734],[5,30.000022888183594,28.000051498413086],[5,30.000022888183594,28.000051498413086],[5,41.77272033691406,22.295406341552734],[5,43.03263854980469,20.426424026489258],[5,41.77272033691406,5.704692840576172],[5,30.000022888183594,28.000051498413086],[5,43.03263854980469,7.573676586151123],[5,43.03263854980469,7.573676586151123],[5,30.000022888183594,28.000051498413086],[5,44.6478385925293,11.768717765808105],[5,43.03263854980469,7.573676586151123],[5,44.6478385925293,11.768717765808105],[5,43.9982795715332,9.610347747802734],[5,30.000022888183594,0.000050000002374872565],[5,30.000022888183594,28.000051498413086],[5,32.24764633178711,0.1693996638059616],[5,32.24764633178711,0.1693996638059616],[5,30.000022888183594,28.000051498413086],[5,41.77272033691406,5.704692840576172],[5,32.24764633178711,0.1693996638059616],[5,41.77272033691406,5.704692840576172],[5,34.44451904296875,0.6736247539520264],[5,34.44451904296875,0.6736247539520264],[5,41.77272033691406,5.704692840576172],[5,40.24697494506836,4.04559850692749],[5,34.44451904296875,0.6736247539520264],[5,40.24697494506836,4.04559850692749],[5,36.541038513183594,1.5013397932052612],[5,36.541038513183594,1.5013397932052612],[5,40.24697494506836,4.04559850692749],[5,38.4898567199707,2.6338553428649902],[5,40.24697494506836,23.95450210571289],[5,41.77272033691406,22.295406341552734],[5,38.4898567199707,25.36624526977539],[5,38.4898567199707,25.36624526977539],[5,41.77272033691406,22.295406341552734],[5,32.24764633178711,27.83070182800293],[5,38.4898567199707,25.36624526977539],[5,32.24764633178711,27.83070182800293],[5,36.541038513183594,26.498760223388672],[5,36.541038513183594,26.498760223388672],[5,32.24764633178711,27.83070182800293],[5,34.44451904296875,27.326475143432617],[5,44.966651916503906,14.00005054473877],[5,44.6478385925293,11.768717765808105],[5,44.6478385925293,16.23138427734375],[5,44.6478385925293,16.23138427734375],[5,44.6478385925293,11.768717765808105],[5,30.000022888183594,28.000051498413086],[5,44.6478385925293,16.23138427734375],[5,30.000022888183594,28.000051498413086],[5,43.9982795715332,18.389753341674805],[5,43.9982795715332,18.389753341674805],[5,30.000022888183594,28.000051498413086],[5,43.03263854980469,20.426424026489258],[8,44.966651916503906,14.00005054473877],[5,44.966651916503906,14.00005054473877],[5,44.6478385925293,16.23138427734375],[8,44.966651916503906,14.00005054473877],[5,44.6478385925293,16.23138427734375],[8,44.6478385925293,16.23138427734375],[8,44.6478385925293,16.23138427734375],[5,44.6478385925293,16.23138427734375],[5,43.9982795715332,18.389753341674805],[8,44.6478385925293,16.23138427734375],[5,43.9982795715332,18.389753341674805],[8,43.9982795715332,18.389753341674805],[8,43.9982795715332,18.389753341674805],[5,43.9982795715332,18.389753341674805],[5,43.03263854980469,20.426424026489258],[8,43.9982795715332,18.389753341674805],[5,43.03263854980469,20.426424026489258],[8,43.03263854980469,20.426424026489258],[8,43.03263854980469,20.426424026489258],[5,43.03263854980469,20.426424026489258],[5,41.77272033691406,22.295406341552734],[8,43.03263854980469,20.426424026489258],[5,41.77272033691406,22.295406341552734],[8,41.77272033691406,22.295406341552734],[8,41.77272033691406,22.295406341552734],[5,41.77272033691406,22.295406341552734],[5,40.24697494506836,23.95450210571289],[8,41.77272033691406,22.295406341552734],[5,40.24697494506836,23.95450210571289],[8,40.24697494506836,23.95450210571289],[8,40.24697494506836,23.95450210571289],[5,40.24697494506836,23.95450210571289],[5,38.4898567199707,25.36624526977539],[8,40.24697494506836,23.95450210571289],[5,38.4898567199707,25.36624526977539],[8,38.4898567199707,25.36624526977539],[8,38.4898567199707,25.36624526977539],[5,38.4898567199707,25.36624526977539],[5,36.541038513183594,26.498760223388672],[8,38.4898567199707,25.36624526977539],[5,36.541038513183594,26.498760223388672],[8,36.541038513183594,26.498760223388672],[8,36.541038513183594,26.498760223388672],[5,36.541038513183594,26.498760223388672],[5,34.44451904296875,27.326475143432617],[8,36.541038513183594,26.498760223388672],[5,34.44451904296875,27.326475143432617],[8,34.44451904296875,27.326475143432617],[8,34.44451904296875,27.326475143432617],[5,34.44451904296875,27.326475143432617],[5,32.24764633178711,27.83070182800293],[8,34.44451904296875,27.326475143432617],[5,32.24764633178711,27.83070182800293],[8,32.24764633178711,27.83070182800293],[8,32.24764633178711,27.83070182800293],[5,32.24764633178711,27.83070182800293],[5,30.000022888183594,28.000051498413086],[8,32.24764633178711,27.83070182800293],[5,30.000022888183594,28.000051498413086],[8,30.000022888183594,28.000051498413086],[8,30.000022888183594,0.000050000002374872565],[5,30.000022888183594,0.000050000002374872565],[5,32.24764633178711,0.1693996638059616],[8,30.000022888183594,0.000050000002374872565],[5,32.24764633178711,0.1693996638059616],[8,32.24764633178711,0.1693996638059616],[8,32.24764633178711,0.1693996638059616],[5,32.24764633178711,0.1693996638059616],[5,34.44451904296875,0.6736247539520264],[8,32.24764633178711,0.1693996638059616],[5,34.44451904296875,0.6736247539520264],[8,34.44451904296875,0.6736247539520264],[8,34.44451904296875,0.6736247539520264],[5,34.44451904296875,0.6736247539520264],[5,36.541038513183594,1.5013397932052612],[8,34.44451904296875,0.6736247539520264],[5,36.541038513183594,1.5013397932052612],[8,36.541038513183594,1.5013397932052612],[8,36.541038513183594,1.5013397932052612],[5,36.541038513183594,1.5013397932052612],[5,38.4898567199707,2.6338553428649902],[8,36.541038513183594,1.5013397932052612],[5,38.4898567199707,2.6338553428649902],[8,38.4898567199707,2.6338553428649902],[8,38.4898567199707,2.6338553428649902],[5,38.4898567199707,2.6338553428649902],[5,40.24697494506836,4.04559850692749],[8,38.4898567199707,2.6338553428649902],[5,40.24697494506836,4.04559850692749],[8,40.24697494506836,4.04559850692749],[8,40.24697494506836,4.04559850692749],[5,40.24697494506836,4.04559850692749],[5,41.77272033691406,5.704692840576172],[8,40.24697494506836,4.04559850692749],[5,41.77272033691406,5.704692840576172],[8,41.77272033691406,5.704692840576172],[8,41.77272033691406,5.704692840576172],[5,41.77272033691406,5.704692840576172],[5,43.03263854980469,7.573676586151123],[8,41.77272033691406,5.704692840576172],[5,43.03263854980469,7.573676586151123],[8,43.03263854980469,7.573676586151123],[8,43.03263854980469,7.573676586151123],[5,43.03263854980469,7.573676586151123],[5,43.9982795715332,9.610347747802734],[8,43.03263854980469,7.573676586151123],[5,43.9982795715332,9.610347747802734],[8,43.9982795715332,9.610347747802734],[8,43.9982795715332,9.610347747802734],[5,43.9982795715332,9.610347747802734],[5,44.6478385925293,11.768717765808105],[8,43.9982795715332,9.610347747802734],[5,44.6478385925293,11.768717765808105],[8,44.6478385925293,11.768717765808105],[8,44.6478385925293,11.768717765808105],[5,44.6478385925293,11.768717765808105],[5,44.966651916503906,14.00005054473877],[8,44.6478385925293,11.768717765808105],[5,44.966651916503906,14.00005054473877],[8,44.966651916503906,14.00005054473877],[58,31.000022888183594,14.00005054473877],[58,30.874530792236328,16.000051498413086],[58,30.874530792236328,12.00005054473877],[40.87483596801758,25.736982345581055,2.1375997066497803],[8,15.874530792236328,12.00005054473877],[8,25.736982345581055,2.1375997066497803],[8,15.874530792236328,16.000051498413086],[40.87483596801758,25.736982345581055,25.862499237060547],[8,25.736982345581055,25.862499237060547],[44.053531646728516,26.69059181213379,24.923906326293945],[43.691871643066406,26.582094192504883,25.03069496154785],[55.92249298095703,30.251279830932617,9.20854663848877],[8,15.874530792236328,16.000051498413086],[8,15.874530792236328,12.00005054473877],[40.87483596801758,25.736982345581055,25.862499237060547],[40.87483596801758,25.736982345581055,25.862499237060547],[8,15.874530792236328,12.00005054473877],[40.87483596801758,25.736982345581055,2.1375997066497803],[40.87483596801758,25.736982345581055,25.862499237060547],[40.87483596801758,25.736982345581055,2.1375997066497803],[43.691871643066406,26.582094192504883,25.03069496154785],[43.691871643066406,26.582094192504883,25.03069496154785],[40.87483596801758,25.736982345581055,2.1375997066497803],[43.38553237915039,26.490190505981445,2.8655965328216553],[43.691871643066406,26.582094192504883,25.03069496154785],[43.38553237915039,26.490190505981445,2.8655965328216553],[43.692378997802734,26.582246780395508,2.9689066410064697],[46.9597053527832,27.562442779541016,23.90891456604004],[44.053531646728516,26.69059181213379,24.923906326293945],[48.80404281616211,28.11574363708496,23.143686294555664],[48.80404281616211,28.11574363708496,23.143686294555664],[44.053531646728516,26.69059181213379,24.923906326293945],[55.92249298095703,30.251279830932617,9.20854663848877],[48.80404281616211,28.11574363708496,23.143686294555664],[55.92249298095703,30.251279830932617,9.20854663848877],[49.573028564453125,28.3464412689209,22.824626922607422],[43.692378997802734,26.582246780395508,2.9689066410064697],[46.35269546508789,27.380340576171875,3.864579439163208],[43.691871643066406,26.582094192504883,25.03069496154785],[43.691871643066406,26.582094192504883,25.03069496154785],[46.35269546508789,27.380340576171875,3.864579439163208],[48.824859619140625,28.12198829650879,4.852006435394287],[43.691871643066406,26.582094192504883,25.03069496154785],[48.824859619140625,28.12198829650879,4.852006435394287],[49.031253814697266,28.18390655517578,4.934443950653076],[58,30.874530792236328,12.00005054473877],[58,30.874530792236328,16.000051498413086],[57.77556610107422,30.807201385498047,11.575401306152344],[57.77556610107422,30.807201385498047,11.575401306152344],[58,30.874530792236328,16.000051498413086],[57.78570556640625,30.810243606567383,16.425212860107422],[51.87522506713867,29.037099838256836,21.678625106811523],[49.573028564453125,28.3464412689209,22.824626922607422],[52.91258239746094,29.34830665588379,21.048480987548828],[52.91258239746094,29.34830665588379,21.048480987548828],[49.573028564453125,28.3464412689209,22.824626922607422],[55.92249298095703,30.251279830932617,9.20854663848877],[52.91258239746094,29.34830665588379,21.048480987548828],[55.92249298095703,30.251279830932617,9.20854663848877],[53.850196838378906,29.62959098815918,20.47892189025879],[53.850196838378906,29.62959098815918,20.47892189025879],[55.92249298095703,30.251279830932617,9.20854663848877],[55.9259033203125,30.252304077148438,18.792081832885742],[53.850196838378906,29.62959098815918,20.47892189025879],[55.9259033203125,30.252304077148438,18.792081832885742],[55.484127044677734,30.119770050048828,19.23390769958496],[55.158836364746094,30.02218246459961,8.492351531982422],[55.92249298095703,30.251279830932617,9.20854663848877],[53.44977569580078,29.509464263916016,7.256449222564697],[53.44977569580078,29.509464263916016,7.256449222564697],[55.92249298095703,30.251279830932617,9.20854663848877],[43.691871643066406,26.582094192504883,25.03069496154785],[53.44977569580078,29.509464263916016,7.256449222564697],[43.691871643066406,26.582094192504883,25.03069496154785],[52.92253112792969,29.35129165649414,6.950313568115234],[52.92253112792969,29.35129165649414,6.950313568115234],[43.691871643066406,26.582094192504883,25.03069496154785],[49.031253814697266,28.18390655517578,4.934443950653076],[52.92253112792969,29.35129165649414,6.950313568115234],[49.031253814697266,28.18390655517578,4.934443950653076],[51.4024772644043,28.895273208618164,6.067709445953369],[56.765594482421875,30.504209518432617,17.952293395996094],[55.9259033203125,30.252304077148438,18.792081832885742],[57.60542297363281,30.75615882873535,16.782894134521484],[57.60542297363281,30.75615882873535,16.782894134521484],[55.9259033203125,30.252304077148438,18.792081832885742],[55.92249298095703,30.251279830932617,9.20854663848877],[57.60542297363281,30.75615882873535,16.782894134521484],[55.92249298095703,30.251279830932617,9.20854663848877],[57.78570556640625,30.810243606567383,16.425212860107422],[57.78570556640625,30.810243606567383,16.425212860107422],[55.92249298095703,30.251279830932617,9.20854663848877],[56.517704010009766,30.42984390258789,9.766770362854004],[57.78570556640625,30.810243606567383,16.425212860107422],[56.517704010009766,30.42984390258789,9.766770362854004],[57.77556610107422,30.807201385498047,11.575401306152344],[57.77556610107422,30.807201385498047,11.575401306152344],[56.517704010009766,30.42984390258789,9.766770362854004],[57.46689987182617,30.714601516723633,10.99138355255127] ],
faces=[[0,1,2],[3,4,5],[6,7,8],[9,10,11],[12,13,14],[15,16,17],[18,19,20],[21,22,23],[24,25,26],[27,28,29],[30,31,32],[33,34,35],[36,37,38],[39,40,41],[42,43,44],[45,46,47],[48,49,50],[51,52,53],[54,55,56],[57,58,59],[60,61,62],[63,64,65],[66,67,68],[69,70,71],[72,73,74],[75,76,77],[78,79,80],[81,82,83],[84,85,86],[87,88,89],[90,91,92],[93,94,95],[96,97,98],[99,100,101],[102,103,104],[105,106,107],[108,109,110],[111,112,113],[114,115,116],[117,118,119],[120,121,122],[123,124,125],[126,127,128],[129,130,131],[132,133,134],[135,136,137],[138,139,140],[141,142,143],[144,145,146],[147,148,149],[150,151,152],[153,154,155],[156,157,158],[159,160,161],[162,163,164],[165,166,167],[168,169,170],[171,172,173],[174,175,176],[177,178,179],[180,181,182],[183,184,185],[186,187,188],[189,190,191],[192,193,194],[195,196,197],[198,199,200],[201,202,203],[204,205,206],[207,208,209],[210,211,212],[213,214,215],[216,217,218],[219,220,221],[222,223,224],[225,226,227],[228,229,230],[231,232,233],[234,235,236],[237,238,239],[240,241,242],[243,244,245],[246,247,248],[249,250,251],[252,253,254],[255,256,257],[258,259,260],[261,262,263],[264,265,266],[267,268,269],[270,271,272],[273,274,275],[276,277,278],[279,280,281],[282,283,284],[285,286,287],[288,289,290],[291,292,293],[294,295,296],[297,298,299],[300,301,302],[303,304,305],[306,307,308],[309,310,311],[312,313,314],[315,316,317],[318,319,320],[321,322,323],[324,325,326],[327,328,329],[330,331,332],[333,334,335],[336,337,338],[339,340,341],[342,343,344],[345,346,347],[348,349,350],[351,352,353],[354,355,356],[357,358,359],[360,361,362],[363,364,365],[366,367,368],[369,370,371],[372,373,374],[375,376,377],[378,379,380],[381,382,383],[384,385,386],[387,388,389],[390,391,392],[393,394,395],[396,397,398],[399,400,401],[402,403,404],[405,406,407],[408,409,410],[411,412,413],[414,415,416],[417,418,419],[420,421,422],[423,424,425],[426,427,428],[429,430,431],[432,433,434],[435,436,437],[438,439,440],[441,442,443],[444,445,446],[447,448,449],[450,451,452],[453,454,455],[456,457,458],[459,460,461],[462,463,464],[465,466,467],[468,469,470],[471,472,473],[474,475,476],[477,478,479],[480,481,482],[483,484,485],[486,487,488],[489,490,491],[492,493,494],[495,496,497],[498,499,500],[501,502,503],[504,505,506],[507,508,509],[510,511,512],[513,514,515],[516,517,518],[519,520,521],[522,523,524],[525,526,527],[528,529,530],[531,532,533],[534,535,536],[537,538,539],[540,541,542],[543,544,545],[546,547,548],[549,550,551],[552,553,554],[555,556,557],[558,559,560],[561,562,563],[564,565,566],[567,568,569],[570,571,572],[573,574,575],[576,577,578],[579,580,581],[582,583,584],[585,586,587],[588,589,590],[591,592,593],[594,595,596],[597,598,599],[600,601,602],[603,604,605],[606,607,608],[609,610,611],[612,613,614],[615,616,617],[618,619,620],[621,622,623],[624,625,626],[627,628,629],[630,631,632],[633,634,635],[636,637,638],[639,640,641],[642,643,644],[645,646,647],[648,649,650],[651,652,653],[654,655,656],[657,658,659],[660,661,662],[663,664,665],[666,667,668],[669,670,671],[672,673,674],[675,676,677],[678,679,680],[681,682,683],[684,685,686],[687,688,689],[690,691,692],[693,694,695],[696,697,698],[699,700,701],[702,703,704],[705,706,707],[708,709,710],[711,712,713],[714,715,716],[717,718,719],[720,721,722],[723,724,725],[726,727,728],[729,730,731],[732,733,734],[735,736,737],[738,739,740],[741,742,743],[744,745,746],[747,748,749],[750,751,752],[753,754,755],[756,757,758],[759,760,761],[762,763,764],[765,766,767],[768,769,770],[771,772,773],[774,775,776],[777,778,779],[780,781,782],[783,784,785],[786,787,788],[789,790,791],[792,793,794],[795,796,797],[798,799,800],[801,802,803],[804,805,806],[807,808,809],[810,811,812],[813,814,815],[816,817,818],[819,820,821],[822,823,824],[825,826,827],[828,829,830],[831,832,833],[834,835,836],[837,838,839],[840,841,842],[843,844,845],[846,847,848],[849,850,851],[852,853,854],[855,856,857],[858,859,860],[861,862,863],[864,865,866],[867,868,869],[870,871,872],[873,874,875],[876,877,878],[879,880,881],[882,883,884],[885,886,887],[888,889,890],[891,892,893],[894,895,896],[897,898,899],[900,901,902],[903,904,905],[906,907,908],[909,910,911],[912,913,914],[915,916,917],[918,919,920],[921,922,923],[924,925,926],[927,928,929],[930,931,932],[933,934,935],[936,937,938],[939,940,941],[942,943,944],[945,946,947]]);}
